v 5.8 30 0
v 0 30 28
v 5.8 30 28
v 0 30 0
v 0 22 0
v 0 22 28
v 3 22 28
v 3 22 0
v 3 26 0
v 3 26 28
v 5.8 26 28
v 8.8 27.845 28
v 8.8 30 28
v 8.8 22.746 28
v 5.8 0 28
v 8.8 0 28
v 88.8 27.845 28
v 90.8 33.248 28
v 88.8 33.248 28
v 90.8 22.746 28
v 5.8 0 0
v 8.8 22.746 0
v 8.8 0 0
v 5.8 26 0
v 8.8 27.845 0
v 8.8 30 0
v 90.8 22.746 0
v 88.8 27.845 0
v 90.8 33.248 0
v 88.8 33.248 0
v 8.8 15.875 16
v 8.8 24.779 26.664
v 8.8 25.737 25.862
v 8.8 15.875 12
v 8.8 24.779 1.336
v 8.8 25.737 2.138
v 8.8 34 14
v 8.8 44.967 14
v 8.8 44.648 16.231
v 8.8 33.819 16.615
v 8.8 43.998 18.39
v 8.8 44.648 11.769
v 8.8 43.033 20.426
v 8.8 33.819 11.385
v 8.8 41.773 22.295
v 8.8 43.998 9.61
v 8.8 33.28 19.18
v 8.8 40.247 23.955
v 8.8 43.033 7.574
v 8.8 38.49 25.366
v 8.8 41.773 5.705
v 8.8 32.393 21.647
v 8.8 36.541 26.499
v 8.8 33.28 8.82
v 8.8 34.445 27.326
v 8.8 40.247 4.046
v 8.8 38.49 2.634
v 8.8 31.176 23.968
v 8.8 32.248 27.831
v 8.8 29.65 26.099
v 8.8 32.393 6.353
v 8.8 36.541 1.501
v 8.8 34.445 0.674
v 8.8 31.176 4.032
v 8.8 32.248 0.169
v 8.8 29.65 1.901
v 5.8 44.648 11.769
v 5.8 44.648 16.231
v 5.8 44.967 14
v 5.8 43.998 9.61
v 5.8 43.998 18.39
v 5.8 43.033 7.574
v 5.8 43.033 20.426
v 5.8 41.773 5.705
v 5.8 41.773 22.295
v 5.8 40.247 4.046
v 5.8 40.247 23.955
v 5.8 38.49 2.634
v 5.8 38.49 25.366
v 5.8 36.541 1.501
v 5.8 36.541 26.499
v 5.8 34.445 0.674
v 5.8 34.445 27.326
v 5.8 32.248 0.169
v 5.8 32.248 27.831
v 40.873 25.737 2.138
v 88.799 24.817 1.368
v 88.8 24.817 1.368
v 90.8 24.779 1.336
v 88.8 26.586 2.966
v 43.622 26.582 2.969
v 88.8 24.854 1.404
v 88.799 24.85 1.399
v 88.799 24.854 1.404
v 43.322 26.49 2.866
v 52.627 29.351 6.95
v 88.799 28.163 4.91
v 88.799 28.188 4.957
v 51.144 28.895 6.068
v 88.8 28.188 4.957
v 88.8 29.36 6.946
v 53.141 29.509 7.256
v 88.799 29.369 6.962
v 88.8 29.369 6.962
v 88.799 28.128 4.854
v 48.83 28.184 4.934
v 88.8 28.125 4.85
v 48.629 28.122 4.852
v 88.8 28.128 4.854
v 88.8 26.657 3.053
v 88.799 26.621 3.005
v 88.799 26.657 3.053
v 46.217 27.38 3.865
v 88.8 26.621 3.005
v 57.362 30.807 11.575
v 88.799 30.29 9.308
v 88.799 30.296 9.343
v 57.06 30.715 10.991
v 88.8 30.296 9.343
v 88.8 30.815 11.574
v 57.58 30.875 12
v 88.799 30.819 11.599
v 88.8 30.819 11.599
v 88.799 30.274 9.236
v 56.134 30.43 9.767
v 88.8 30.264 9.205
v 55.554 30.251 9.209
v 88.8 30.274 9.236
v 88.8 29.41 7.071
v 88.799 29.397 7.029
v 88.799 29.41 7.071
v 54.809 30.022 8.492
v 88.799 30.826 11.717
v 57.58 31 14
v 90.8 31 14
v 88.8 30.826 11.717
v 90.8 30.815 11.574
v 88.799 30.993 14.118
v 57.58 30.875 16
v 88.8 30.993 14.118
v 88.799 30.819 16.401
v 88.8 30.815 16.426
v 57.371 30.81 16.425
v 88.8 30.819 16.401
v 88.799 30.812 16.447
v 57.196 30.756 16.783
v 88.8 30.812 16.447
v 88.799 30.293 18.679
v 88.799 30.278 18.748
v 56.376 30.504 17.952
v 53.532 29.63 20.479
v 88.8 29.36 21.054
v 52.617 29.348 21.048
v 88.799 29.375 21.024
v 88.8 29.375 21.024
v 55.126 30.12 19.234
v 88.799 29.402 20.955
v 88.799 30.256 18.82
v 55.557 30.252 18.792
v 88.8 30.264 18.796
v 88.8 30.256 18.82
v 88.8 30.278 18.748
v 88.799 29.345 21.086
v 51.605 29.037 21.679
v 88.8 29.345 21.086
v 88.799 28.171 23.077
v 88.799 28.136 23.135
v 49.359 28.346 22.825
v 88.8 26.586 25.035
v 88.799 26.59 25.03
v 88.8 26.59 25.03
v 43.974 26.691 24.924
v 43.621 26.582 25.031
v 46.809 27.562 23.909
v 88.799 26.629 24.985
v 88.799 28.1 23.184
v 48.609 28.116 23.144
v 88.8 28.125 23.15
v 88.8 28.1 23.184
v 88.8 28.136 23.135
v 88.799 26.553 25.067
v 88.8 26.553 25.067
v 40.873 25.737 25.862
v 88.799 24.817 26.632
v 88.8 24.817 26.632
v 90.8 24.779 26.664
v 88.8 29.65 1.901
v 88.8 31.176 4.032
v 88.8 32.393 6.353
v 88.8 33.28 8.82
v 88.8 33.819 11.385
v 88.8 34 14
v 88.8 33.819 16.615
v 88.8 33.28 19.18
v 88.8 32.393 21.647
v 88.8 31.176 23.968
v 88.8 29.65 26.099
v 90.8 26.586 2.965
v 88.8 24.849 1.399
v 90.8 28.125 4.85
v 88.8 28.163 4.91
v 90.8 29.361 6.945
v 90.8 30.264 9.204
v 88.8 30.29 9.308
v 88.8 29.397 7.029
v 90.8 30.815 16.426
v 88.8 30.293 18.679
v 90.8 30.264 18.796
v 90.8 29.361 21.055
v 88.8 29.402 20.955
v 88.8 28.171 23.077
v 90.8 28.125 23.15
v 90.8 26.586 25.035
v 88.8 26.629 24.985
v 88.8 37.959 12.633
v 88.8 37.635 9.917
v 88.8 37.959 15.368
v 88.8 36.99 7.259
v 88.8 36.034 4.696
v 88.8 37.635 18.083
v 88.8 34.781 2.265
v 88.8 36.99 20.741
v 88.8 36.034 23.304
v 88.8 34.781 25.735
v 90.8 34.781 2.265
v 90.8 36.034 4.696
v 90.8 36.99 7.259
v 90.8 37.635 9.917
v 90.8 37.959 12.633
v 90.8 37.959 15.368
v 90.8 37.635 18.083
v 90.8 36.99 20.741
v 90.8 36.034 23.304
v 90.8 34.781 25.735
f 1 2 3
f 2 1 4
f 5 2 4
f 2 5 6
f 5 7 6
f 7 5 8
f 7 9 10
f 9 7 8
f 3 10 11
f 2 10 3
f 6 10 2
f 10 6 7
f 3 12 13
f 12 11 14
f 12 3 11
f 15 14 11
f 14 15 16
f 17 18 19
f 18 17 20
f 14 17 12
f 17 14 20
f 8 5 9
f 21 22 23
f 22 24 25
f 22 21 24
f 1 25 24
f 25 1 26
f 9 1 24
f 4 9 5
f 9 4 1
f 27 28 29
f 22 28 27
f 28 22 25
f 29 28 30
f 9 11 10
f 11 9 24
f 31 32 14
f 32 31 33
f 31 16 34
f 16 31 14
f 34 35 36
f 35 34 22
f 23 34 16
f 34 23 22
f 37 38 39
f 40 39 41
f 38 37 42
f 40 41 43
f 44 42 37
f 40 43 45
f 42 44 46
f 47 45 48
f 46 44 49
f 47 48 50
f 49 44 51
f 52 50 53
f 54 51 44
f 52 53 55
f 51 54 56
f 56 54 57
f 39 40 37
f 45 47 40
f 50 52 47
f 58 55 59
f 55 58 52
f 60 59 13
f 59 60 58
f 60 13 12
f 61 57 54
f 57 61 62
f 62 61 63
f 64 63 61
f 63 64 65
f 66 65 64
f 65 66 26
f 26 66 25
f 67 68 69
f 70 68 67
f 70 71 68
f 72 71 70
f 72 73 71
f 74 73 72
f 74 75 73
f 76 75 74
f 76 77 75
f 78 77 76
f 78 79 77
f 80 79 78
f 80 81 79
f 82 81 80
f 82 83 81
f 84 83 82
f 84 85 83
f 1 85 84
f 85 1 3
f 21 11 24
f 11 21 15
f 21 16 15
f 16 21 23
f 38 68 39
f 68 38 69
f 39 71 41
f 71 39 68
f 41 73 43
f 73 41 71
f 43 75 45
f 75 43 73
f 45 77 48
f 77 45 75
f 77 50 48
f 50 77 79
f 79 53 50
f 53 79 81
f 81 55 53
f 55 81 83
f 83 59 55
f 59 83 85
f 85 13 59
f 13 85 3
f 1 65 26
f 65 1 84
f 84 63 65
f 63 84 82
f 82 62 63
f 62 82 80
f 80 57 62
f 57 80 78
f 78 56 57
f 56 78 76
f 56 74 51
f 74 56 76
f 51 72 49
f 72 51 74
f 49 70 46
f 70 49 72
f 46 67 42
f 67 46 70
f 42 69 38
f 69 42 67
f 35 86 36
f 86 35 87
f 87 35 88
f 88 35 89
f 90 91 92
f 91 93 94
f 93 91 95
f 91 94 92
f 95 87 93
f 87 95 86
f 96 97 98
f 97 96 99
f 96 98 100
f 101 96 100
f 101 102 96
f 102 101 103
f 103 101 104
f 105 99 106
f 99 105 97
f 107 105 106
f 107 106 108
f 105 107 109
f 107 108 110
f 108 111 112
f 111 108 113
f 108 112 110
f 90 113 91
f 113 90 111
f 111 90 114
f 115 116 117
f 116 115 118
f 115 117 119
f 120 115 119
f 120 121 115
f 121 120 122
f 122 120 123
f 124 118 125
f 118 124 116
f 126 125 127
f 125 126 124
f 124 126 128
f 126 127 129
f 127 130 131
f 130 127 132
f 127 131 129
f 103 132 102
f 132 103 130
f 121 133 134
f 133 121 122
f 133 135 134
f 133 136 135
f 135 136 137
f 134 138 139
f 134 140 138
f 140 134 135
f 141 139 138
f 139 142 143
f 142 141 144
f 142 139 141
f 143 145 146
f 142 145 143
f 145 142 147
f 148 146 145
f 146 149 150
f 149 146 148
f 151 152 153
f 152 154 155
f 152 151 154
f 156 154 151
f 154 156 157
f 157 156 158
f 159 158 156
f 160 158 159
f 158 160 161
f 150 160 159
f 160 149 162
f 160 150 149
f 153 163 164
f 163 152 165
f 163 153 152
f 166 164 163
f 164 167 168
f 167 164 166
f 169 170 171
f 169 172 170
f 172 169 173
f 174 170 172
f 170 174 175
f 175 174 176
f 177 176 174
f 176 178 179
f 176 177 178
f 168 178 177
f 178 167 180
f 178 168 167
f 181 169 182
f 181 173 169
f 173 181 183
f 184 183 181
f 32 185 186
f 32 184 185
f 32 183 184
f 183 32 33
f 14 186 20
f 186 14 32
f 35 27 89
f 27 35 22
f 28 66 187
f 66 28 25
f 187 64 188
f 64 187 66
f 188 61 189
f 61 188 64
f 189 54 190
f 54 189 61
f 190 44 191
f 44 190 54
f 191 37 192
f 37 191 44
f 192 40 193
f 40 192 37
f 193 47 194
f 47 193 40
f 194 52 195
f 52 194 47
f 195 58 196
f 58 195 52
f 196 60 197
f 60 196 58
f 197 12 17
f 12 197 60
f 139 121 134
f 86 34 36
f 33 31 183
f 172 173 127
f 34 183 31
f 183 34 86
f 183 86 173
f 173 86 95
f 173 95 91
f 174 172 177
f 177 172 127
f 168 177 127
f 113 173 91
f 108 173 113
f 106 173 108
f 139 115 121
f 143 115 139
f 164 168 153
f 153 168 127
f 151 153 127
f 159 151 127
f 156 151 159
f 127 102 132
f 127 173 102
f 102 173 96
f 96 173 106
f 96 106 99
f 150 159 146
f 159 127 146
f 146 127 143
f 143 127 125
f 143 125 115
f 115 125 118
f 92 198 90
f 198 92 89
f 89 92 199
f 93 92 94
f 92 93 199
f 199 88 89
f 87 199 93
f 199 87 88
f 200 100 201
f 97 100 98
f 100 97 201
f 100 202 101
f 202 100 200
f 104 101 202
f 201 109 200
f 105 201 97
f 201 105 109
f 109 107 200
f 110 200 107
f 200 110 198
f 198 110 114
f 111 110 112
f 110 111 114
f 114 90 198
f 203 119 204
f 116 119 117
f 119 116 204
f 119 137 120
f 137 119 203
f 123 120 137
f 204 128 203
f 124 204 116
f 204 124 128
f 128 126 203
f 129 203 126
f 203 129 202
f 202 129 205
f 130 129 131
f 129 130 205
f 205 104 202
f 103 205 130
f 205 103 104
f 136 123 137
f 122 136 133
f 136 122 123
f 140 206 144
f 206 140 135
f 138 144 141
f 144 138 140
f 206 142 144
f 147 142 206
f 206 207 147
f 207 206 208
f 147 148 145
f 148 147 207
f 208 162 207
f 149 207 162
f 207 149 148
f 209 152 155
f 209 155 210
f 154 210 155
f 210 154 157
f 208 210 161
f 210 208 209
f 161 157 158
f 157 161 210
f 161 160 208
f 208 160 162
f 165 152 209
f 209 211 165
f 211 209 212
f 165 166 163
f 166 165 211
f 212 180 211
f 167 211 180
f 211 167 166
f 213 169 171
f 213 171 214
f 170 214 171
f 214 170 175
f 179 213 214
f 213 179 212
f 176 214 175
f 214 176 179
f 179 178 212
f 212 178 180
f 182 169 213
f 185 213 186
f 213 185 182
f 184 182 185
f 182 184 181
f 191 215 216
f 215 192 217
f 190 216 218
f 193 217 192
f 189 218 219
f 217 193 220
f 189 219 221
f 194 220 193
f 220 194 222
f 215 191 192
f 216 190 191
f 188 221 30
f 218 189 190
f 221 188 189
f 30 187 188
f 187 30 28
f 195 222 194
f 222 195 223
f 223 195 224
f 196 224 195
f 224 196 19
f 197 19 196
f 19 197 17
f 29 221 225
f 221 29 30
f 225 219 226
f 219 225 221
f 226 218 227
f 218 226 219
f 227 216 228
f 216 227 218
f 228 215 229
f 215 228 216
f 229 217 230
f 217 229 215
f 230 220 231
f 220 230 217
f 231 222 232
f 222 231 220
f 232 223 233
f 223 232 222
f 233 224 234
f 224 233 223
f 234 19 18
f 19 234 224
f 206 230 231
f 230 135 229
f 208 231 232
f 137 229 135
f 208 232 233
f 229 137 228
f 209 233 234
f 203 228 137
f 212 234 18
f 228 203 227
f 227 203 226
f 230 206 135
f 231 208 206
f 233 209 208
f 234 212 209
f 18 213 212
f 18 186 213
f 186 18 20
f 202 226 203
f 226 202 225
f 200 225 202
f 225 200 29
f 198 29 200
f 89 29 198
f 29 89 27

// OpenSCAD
// Remix of "Spool Holder 1KG for NEO GRRF" ( http://www.thingiverse.com/thing:385773 ) by Luchador

// Laurenz 2014-07-06

// of spool holding middle part (use spool width + 5mm)
length = 80;

// of holder gap, orginally 2mm, gave 1.6mm on reprap neo with simplify3D
gapsize=2.8; //should work with 2.5

//original: holder is 5, big part is 3, gap is 2

module holder(gapsize)
{
	//bigger part of the holder unchanged
	difference()
	{
    luchadorspool();

	 translate([3,0,0])
		cube([100,100,100]);
	
	}

	//smaller part - stretch
	translate([3-.1,0,0]) //shift the overlap into position
		difference()
		{
		 scale([(gapsize+.2)/2,1,1]) //make an overlap of two times .1
			translate([-3,0,0])
				luchadorspool();
	
		 translate([gapsize+.2,0,0]) //make an overlap of two times .1
			cube([5000,5000,5000]);
		
		 //cutoff negative part
		 mirror([1,0,0])
			cube([1000,1000,1000]);
		}
}



// Haken
holder(gapsize);

translate([gapsize-2,0,0])
{
	// Anfangsstueck ohne Haken
	difference()
	{
	 luchadorspool();
	 translate([8,0,0])cube([100,100,100]);
	 cube([5,100,100]);
	}
	
	// Skalierter Mittelteil
	translate([8,0,0])
	 scale([length/82,1,1])
	  translate([-8,0,0])
	   difference()
	   {
	    luchadorspool();
	    union()
	    {
	     cube([8-0.001,200,200]);
	     translate([90,0,0])cube([100,100,100]);
	    }
	   }
	
	// Endstueck
	translate([-82+length,0,0])
	difference()
	{
	 luchadorspool();
	 translate([-1,-1,-1])cube([91-0.001,100,100]);
	}
}	


// created with STL to OpenSCAD converter ( http://www.thingiverse.com/thing:62666 ) ( http://jsfiddle.net/Riham/yzvGD/embedded/result/ )
module luchadorspool(scale) {polyhedron(
 points=[[8,24.779094696044922,26.663768768310547],[8,22.745990753173828,28.000051498413086],[8,0.00002421438694000244,28.000051498413086],[8,24.779094696044922,1.336330771446228],[8,25.736982345581055,2.1375997066497803],[8,15.874530792236328,12.00005054473877],[8,25.736982345581055,25.862499237060547],[8,24.779094696044922,26.663768768310547],[8,15.874530792236328,16.000051498413086],[8,15.874530792236328,16.000051498413086],[8,24.779094696044922,26.663768768310547],[8,0.00002421438694000244,28.000051498413086],[8,15.874530792236328,16.000051498413086],[8,0.00002421438694000244,28.000051498413086],[8,15.874530792236328,12.00005054473877],[8,15.874530792236328,12.00005054473877],[8,0.00002421438694000244,28.000051498413086],[8,0.00002421438694000244,0.000050000002374872565],[8,15.874530792236328,12.00005054473877],[8,0.00002421438694000244,0.000050000002374872565],[8,24.779094696044922,1.336330771446228],[8,24.779094696044922,1.336330771446228],[8,0.00002421438694000244,0.000050000002374872565],[8,22.745990753173828,0.000050000002374872565],[40.87483596801758,25.736982345581055,2.1375997066497803],[8,25.736982345581055,2.1375997066497803],[8,24.779094696044922,1.336330771446228],[92,26.586090087890625,2.965418577194214],[43.692378997802734,26.582246780395508,2.9689066410064697],[92,24.779094696044922,1.336330771446228],[92,24.779094696044922,1.336330771446228],[43.692378997802734,26.582246780395508,2.9689066410064697],[43.38553237915039,26.490190505981445,2.8655965328216553],[92,24.779094696044922,1.336330771446228],[43.38553237915039,26.490190505981445,2.8655965328216553],[40.87483596801758,25.736982345581055,2.1375997066497803],[51.4024772644043,28.895273208618164,6.067709445953369],[92,28.125194549560547,4.849645614624023],[52.92253112792969,29.35129165649414,6.950313568115234],[52.92253112792969,29.35129165649414,6.950313568115234],[92,28.125194549560547,4.849645614624023],[92,29.360822677612305,6.945445537567139],[52.92253112792969,29.35129165649414,6.950313568115234],[92,29.360822677612305,6.945445537567139],[53.44977569580078,29.509464263916016,7.256449222564697],[51.4024772644043,28.895273208618164,6.067709445953369],[49.031253814697266,28.18390655517578,4.934443950653076],[92,28.125194549560547,4.849645614624023],[92,28.125194549560547,4.849645614624023],[49.031253814697266,28.18390655517578,4.934443950653076],[48.824859619140625,28.12198829650879,4.852006435394287],[92,28.125194549560547,4.849645614624023],[48.824859619140625,28.12198829650879,4.852006435394287],[92,26.586090087890625,2.965418577194214],[92,26.586090087890625,2.965418577194214],[48.824859619140625,28.12198829650879,4.852006435394287],[46.35269546508789,27.380340576171875,3.864579439163208],[92,26.586090087890625,2.965418577194214],[46.35269546508789,27.380340576171875,3.864579439163208],[43.692378997802734,26.582246780395508,2.9689066410064697],[57.46689987182617,30.714601516723633,10.99138355255127],[92,30.264408111572266,9.204360961914062],[57.77556610107422,30.807201385498047,11.575401306152344],[57.77556610107422,30.807201385498047,11.575401306152344],[92,30.264408111572266,9.204360961914062],[92,30.81505012512207,11.5741605758667],[57.77556610107422,30.807201385498047,11.575401306152344],[92,30.81505012512207,11.5741605758667],[58,30.874530792236328,12.00005054473877],[57.46689987182617,30.714601516723633,10.99138355255127],[56.517704010009766,30.42984390258789,9.766770362854004],[92,30.264408111572266,9.204360961914062],[92,30.264408111572266,9.204360961914062],[56.517704010009766,30.42984390258789,9.766770362854004],[55.92249298095703,30.251279830932617,9.20854663848877],[92,30.264408111572266,9.204360961914062],[55.92249298095703,30.251279830932617,9.20854663848877],[92,29.360822677612305,6.945445537567139],[92,29.360822677612305,6.945445537567139],[55.92249298095703,30.251279830932617,9.20854663848877],[55.158836364746094,30.02218246459961,8.492351531982422],[92,29.360822677612305,6.945445537567139],[55.158836364746094,30.02218246459961,8.492351531982422],[53.44977569580078,29.509464263916016,7.256449222564697],[58,30.874530792236328,12.00005054473877],[92,30.81505012512207,11.5741605758667],[58,31.000022888183594,14.00005054473877],[58,31.000022888183594,14.00005054473877],[92,30.81505012512207,11.5741605758667],[92,31.000022888183594,14.00005054473877],[58,31.000022888183594,14.00005054473877],[92,31.000022888183594,14.00005054473877],[58,30.874530792236328,16.000051498413086],[58,30.874530792236328,16.000051498413086],[92,31.000022888183594,14.00005054473877],[92,30.81505012512207,16.425941467285156],[58,30.874530792236328,16.000051498413086],[92,30.81505012512207,16.425941467285156],[57.78570556640625,30.810243606567383,16.425212860107422],[57.78570556640625,30.810243606567383,16.425212860107422],[92,30.81505012512207,16.425941467285156],[57.60542297363281,30.75615882873535,16.782894134521484],[57.60542297363281,30.75615882873535,16.782894134521484],[92,30.81505012512207,16.425941467285156],[92,30.264408111572266,18.795740127563477],[57.60542297363281,30.75615882873535,16.782894134521484],[92,30.264408111572266,18.795740127563477],[56.765594482421875,30.504209518432617,17.952293395996094],[52.91258239746094,29.34830665588379,21.048480987548828],[53.850196838378906,29.62959098815918,20.47892189025879],[92,29.360822677612305,21.05465316772461],[92,29.360822677612305,21.05465316772461],[53.850196838378906,29.62959098815918,20.47892189025879],[55.484127044677734,30.119770050048828,19.23390769958496],[92,29.360822677612305,21.05465316772461],[55.484127044677734,30.119770050048828,19.23390769958496],[92,30.264408111572266,18.795740127563477],[92,30.264408111572266,18.795740127563477],[55.484127044677734,30.119770050048828,19.23390769958496],[55.9259033203125,30.252304077148438,18.792081832885742],[92,30.264408111572266,18.795740127563477],[55.9259033203125,30.252304077148438,18.792081832885742],[56.765594482421875,30.504209518432617,17.952293395996094],[52.91258239746094,29.34830665588379,21.048480987548828],[92,29.360822677612305,21.05465316772461],[51.87522506713867,29.037099838256836,21.678625106811523],[51.87522506713867,29.037099838256836,21.678625106811523],[92,29.360822677612305,21.05465316772461],[92,28.125194549560547,23.150455474853516],[51.87522506713867,29.037099838256836,21.678625106811523],[92,28.125194549560547,23.150455474853516],[49.573028564453125,28.3464412689209,22.824626922607422],[43.691871643066406,26.582094192504883,25.03069496154785],[44.053531646728516,26.69059181213379,24.923906326293945],[92,26.586090087890625,25.03468132019043],[92,26.586090087890625,25.03468132019043],[44.053531646728516,26.69059181213379,24.923906326293945],[46.9597053527832,27.562442779541016,23.90891456604004],[92,26.586090087890625,25.03468132019043],[46.9597053527832,27.562442779541016,23.90891456604004],[92,28.125194549560547,23.150455474853516],[92,28.125194549560547,23.150455474853516],[46.9597053527832,27.562442779541016,23.90891456604004],[48.80404281616211,28.11574363708496,23.143686294555664],[92,28.125194549560547,23.150455474853516],[48.80404281616211,28.11574363708496,23.143686294555664],[49.573028564453125,28.3464412689209,22.824626922607422],[43.691871643066406,26.582094192504883,25.03069496154785],[92,26.586090087890625,25.03468132019043],[40.87483596801758,25.736982345581055,25.862499237060547],[40.87483596801758,25.736982345581055,25.862499237060547],[92,26.586090087890625,25.03468132019043],[92,24.779094696044922,26.663768768310547],[40.87483596801758,25.736982345581055,25.862499237060547],[92,24.779094696044922,26.663768768310547],[8,25.736982345581055,25.862499237060547],[8,25.736982345581055,25.862499237060547],[92,24.779094696044922,26.663768768310547],[8,24.779094696044922,26.663768768310547],[8,24.779094696044922,26.663768768310547],[92,24.779094696044922,26.663768768310547],[92,22.745990753173828,28.000051498413086],[8,24.779094696044922,26.663768768310547],[92,22.745990753173828,28.000051498413086],[8,22.745990753173828,28.000051498413086],[40.87483596801758,25.736982345581055,2.1375997066497803],[8,24.779094696044922,1.336330771446228],[92,24.779094696044922,1.336330771446228],[92,24.779094696044922,1.336330771446228],[8,24.779094696044922,1.336330771446228],[8,22.745990753173828,0.000050000002374872565],[92,24.779094696044922,1.336330771446228],[8,22.745990753173828,0.000050000002374872565],[92,22.745990753173828,0.000050000002374872565],[2.423311710667139e-15,30.000022888183594,0.000050000002374872565],[2.423311710667139e-15,30.000022888183594,28.000051498413086],[5,30.000022888183594,0.000050000002374872565],[5,30.000022888183594,0.000050000002374872565],[2.423311710667139e-15,30.000022888183594,28.000051498413086],[5,30.000022888183594,28.000051498413086],[8,34.44451904296875,0.6736247539520264],[8,31.175521850585938,4.0324387550354],[8,29.64979362487793,1.9011133909225464],[8,27.845256805419922,0.000050000002374872565],[8,30.000022888183594,0.000050000002374872565],[8,29.64979362487793,1.9011133909225464],[8,29.64979362487793,1.9011133909225464],[8,30.000022888183594,0.000050000002374872565],[8,32.24764633178711,0.1693996638059616],[8,29.64979362487793,1.9011133909225464],[8,32.24764633178711,0.1693996638059616],[8,34.44451904296875,0.6736247539520264],[8,33.8192253112793,16.614952087402344],[8,43.03263854980469,20.426424026489258],[8,33.28026580810547,19.180086135864258],[8,33.28026580810547,19.180086135864258],[8,43.03263854980469,20.426424026489258],[8,41.77272033691406,22.295406341552734],[8,33.28026580810547,19.180086135864258],[8,41.77272033691406,22.295406341552734],[8,32.393402099609375,21.646636962890625],[8,43.03263854980469,7.573676586151123],[8,33.8192253112793,11.385149002075195],[8,33.28026580810547,8.820013999938965],[8,34.44451904296875,0.6736247539520264],[8,36.541038513183594,1.5013397932052612],[8,31.175521850585938,4.0324387550354],[8,31.175521850585938,4.0324387550354],[8,36.541038513183594,1.5013397932052612],[8,38.4898567199707,2.6338553428649902],[8,31.175521850585938,4.0324387550354],[8,38.4898567199707,2.6338553428649902],[8,32.393402099609375,6.353463172912598],[8,32.393402099609375,6.353463172912598],[8,38.4898567199707,2.6338553428649902],[8,40.24697494506836,4.04559850692749],[8,32.393402099609375,6.353463172912598],[8,40.24697494506836,4.04559850692749],[8,33.28026580810547,8.820013999938965],[8,33.28026580810547,8.820013999938965],[8,40.24697494506836,4.04559850692749],[8,41.77272033691406,5.704692840576172],[8,33.28026580810547,8.820013999938965],[8,41.77272033691406,5.704692840576172],[8,43.03263854980469,7.573676586151123],[8,30.000022888183594,28.000051498413086],[8,27.845256805419922,28.000051498413086],[8,32.24764633178711,27.83070182800293],[8,32.24764633178711,27.83070182800293],[8,27.845256805419922,28.000051498413086],[8,29.64979362487793,26.098987579345703],[8,32.24764633178711,27.83070182800293],[8,29.64979362487793,26.098987579345703],[8,34.44451904296875,27.326475143432617],[8,34.44451904296875,27.326475143432617],[8,29.64979362487793,26.098987579345703],[8,31.175521850585938,23.967660903930664],[8,41.77272033691406,22.295406341552734],[8,40.24697494506836,23.95450210571289],[8,32.393402099609375,21.646636962890625],[8,32.393402099609375,21.646636962890625],[8,40.24697494506836,23.95450210571289],[8,38.4898567199707,25.36624526977539],[8,32.393402099609375,21.646636962890625],[8,38.4898567199707,25.36624526977539],[8,31.175521850585938,23.967660903930664],[8,31.175521850585938,23.967660903930664],[8,38.4898567199707,25.36624526977539],[8,36.541038513183594,26.498760223388672],[8,31.175521850585938,23.967660903930664],[8,36.541038513183594,26.498760223388672],[8,34.44451904296875,27.326475143432617],[8,43.03263854980469,7.573676586151123],[8,43.9982795715332,9.610347747802734],[8,33.8192253112793,11.385149002075195],[8,33.8192253112793,11.385149002075195],[8,43.9982795715332,9.610347747802734],[8,44.6478385925293,11.768717765808105],[8,33.8192253112793,11.385149002075195],[8,44.6478385925293,11.768717765808105],[8,34.000022888183594,14.00005054473877],[8,44.6478385925293,11.768717765808105],[8,44.966651916503906,14.00005054473877],[8,34.000022888183594,14.00005054473877],[8,34.000022888183594,14.00005054473877],[8,44.966651916503906,14.00005054473877],[8,44.6478385925293,16.23138427734375],[8,34.000022888183594,14.00005054473877],[8,44.6478385925293,16.23138427734375],[8,33.8192253112793,16.614952087402344],[8,33.8192253112793,16.614952087402344],[8,44.6478385925293,16.23138427734375],[8,43.9982795715332,18.389753341674805],[8,33.8192253112793,16.614952087402344],[8,43.9982795715332,18.389753341674805],[8,43.03263854980469,20.426424026489258],[0,22.000024795532227,28.000051498413086],[2.423311710667139e-15,30.000022888183594,28.000051498413086],[0,22.000024795532227,0.000050000002374872565],[0,22.000024795532227,0.000050000002374872565],[2.423311710667139e-15,30.000022888183594,28.000051498413086],[2.423311710667139e-15,30.000022888183594,0.000050000002374872565],[3,22.000024795532227,28.000051498413086],[0,22.000024795532227,28.000051498413086],[3,22.000024795532227,0.000050000002374872565],[3,22.000024795532227,0.000050000002374872565],[0,22.000024795532227,28.000051498413086],[0,22.000024795532227,0.000050000002374872565],[3,26.000024795532227,28.000051498413086],[3,22.000024795532227,28.000051498413086],[3,26.000024795532227,0.000050000002374872565],[3,26.000024795532227,0.000050000002374872565],[3,22.000024795532227,28.000051498413086],[3,22.000024795532227,0.000050000002374872565],[5,26.000024795532227,28.000051498413086],[3,26.000024795532227,28.000051498413086],[5,26.000024795532227,0.000050000002374872565],[5,26.000024795532227,0.000050000002374872565],[3,26.000024795532227,28.000051498413086],[3,26.000024795532227,0.000050000002374872565],[5,0.00002421438694000244,28.000051498413086],[5,26.000024795532227,28.000051498413086],[5,0.00002421438694000244,0.000050000002374872565],[5,0.00002421438694000244,0.000050000002374872565],[5,26.000024795532227,28.000051498413086],[5,26.000024795532227,0.000050000002374872565],[8,0.00002421438694000244,28.000051498413086],[5,0.00002421438694000244,28.000051498413086],[8,0.00002421438694000244,0.000050000002374872565],[8,0.00002421438694000244,0.000050000002374872565],[5,0.00002421438694000244,28.000051498413086],[5,0.00002421438694000244,0.000050000002374872565],[0,22.000024795532227,28.000051498413086],[3,22.000024795532227,28.000051498413086],[2.423311710667139e-15,30.000022888183594,28.000051498413086],[2.423311710667139e-15,30.000022888183594,28.000051498413086],[3,22.000024795532227,28.000051498413086],[3,26.000024795532227,28.000051498413086],[2.423311710667139e-15,30.000022888183594,28.000051498413086],[3,26.000024795532227,28.000051498413086],[5,30.000022888183594,28.000051498413086],[5,30.000022888183594,28.000051498413086],[3,26.000024795532227,28.000051498413086],[5,26.000024795532227,28.000051498413086],[5,30.000022888183594,28.000051498413086],[5,26.000024795532227,28.000051498413086],[8,30.000022888183594,28.000051498413086],[8,30.000022888183594,28.000051498413086],[5,26.000024795532227,28.000051498413086],[8,27.845256805419922,28.000051498413086],[92,22.745990753173828,28.000051498413086],[92,33.248313903808594,28.000051498413086],[90,33.248313903808594,28.000051498413086],[5,0.00002421438694000244,28.000051498413086],[8,0.00002421438694000244,28.000051498413086],[5,26.000024795532227,28.000051498413086],[5,26.000024795532227,28.000051498413086],[8,0.00002421438694000244,28.000051498413086],[8,22.745990753173828,28.000051498413086],[5,26.000024795532227,28.000051498413086],[8,22.745990753173828,28.000051498413086],[8,27.845256805419922,28.000051498413086],[8,27.845256805419922,28.000051498413086],[8,22.745990753173828,28.000051498413086],[92,22.745990753173828,28.000051498413086],[8,27.845256805419922,28.000051498413086],[92,22.745990753173828,28.000051498413086],[90,27.845256805419922,28.000051498413086],[90,27.845256805419922,28.000051498413086],[92,22.745990753173828,28.000051498413086],[90,33.248313903808594,28.000051498413086],[8,22.745990753173828,0.000050000002374872565],[8,0.00002421438694000244,0.000050000002374872565],[5,0.00002421438694000244,0.000050000002374872565],[8,30.000022888183594,0.000050000002374872565],[8,27.845256805419922,0.000050000002374872565],[5,30.000022888183594,0.000050000002374872565],[5,30.000022888183594,0.000050000002374872565],[8,27.845256805419922,0.000050000002374872565],[5,26.000024795532227,0.000050000002374872565],[5,30.000022888183594,0.000050000002374872565],[5,26.000024795532227,0.000050000002374872565],[2.423311710667139e-15,30.000022888183594,0.000050000002374872565],[2.423311710667139e-15,30.000022888183594,0.000050000002374872565],[5,26.000024795532227,0.000050000002374872565],[3,26.000024795532227,0.000050000002374872565],[2.423311710667139e-15,30.000022888183594,0.000050000002374872565],[3,26.000024795532227,0.000050000002374872565],[0,22.000024795532227,0.000050000002374872565],[0,22.000024795532227,0.000050000002374872565],[3,26.000024795532227,0.000050000002374872565],[3,22.000024795532227,0.000050000002374872565],[90,33.248313903808594,0.000050000002374872565],[92,33.248313903808594,0.000050000002374872565],[90,27.845256805419922,0.000050000002374872565],[90,27.845256805419922,0.000050000002374872565],[92,33.248313903808594,0.000050000002374872565],[92,22.745990753173828,0.000050000002374872565],[90,27.845256805419922,0.000050000002374872565],[92,22.745990753173828,0.000050000002374872565],[8,27.845256805419922,0.000050000002374872565],[8,27.845256805419922,0.000050000002374872565],[92,22.745990753173828,0.000050000002374872565],[8,22.745990753173828,0.000050000002374872565],[8,27.845256805419922,0.000050000002374872565],[8,22.745990753173828,0.000050000002374872565],[5,26.000024795532227,0.000050000002374872565],[5,26.000024795532227,0.000050000002374872565],[8,22.745990753173828,0.000050000002374872565],[5,0.00002421438694000244,0.000050000002374872565],[90,27.845256805419922,0.000050000002374872565],[8,27.845256805419922,0.000050000002374872565],[8,29.64979362487793,1.9011133909225464],[90,27.845256805419922,0.000050000002374872565],[8,29.64979362487793,1.9011133909225464],[90,29.64979362487793,1.9011133909225464],[90,29.64979362487793,1.9011133909225464],[8,29.64979362487793,1.9011133909225464],[8,31.175521850585938,4.0324387550354],[90,29.64979362487793,1.9011133909225464],[8,31.175521850585938,4.0324387550354],[90,31.175521850585938,4.0324387550354],[90,31.175521850585938,4.0324387550354],[8,31.175521850585938,4.0324387550354],[8,32.393402099609375,6.353463172912598],[90,31.175521850585938,4.0324387550354],[8,32.393402099609375,6.353463172912598],[90,32.393402099609375,6.353463172912598],[90,32.393402099609375,6.353463172912598],[8,32.393402099609375,6.353463172912598],[8,33.28026580810547,8.820013999938965],[90,32.393402099609375,6.353463172912598],[8,33.28026580810547,8.820013999938965],[90,33.28026580810547,8.820013999938965],[90,33.28026580810547,8.820013999938965],[8,33.28026580810547,8.820013999938965],[8,33.8192253112793,11.385149002075195],[90,33.28026580810547,8.820013999938965],[8,33.8192253112793,11.385149002075195],[90,33.8192253112793,11.385149002075195],[90,33.8192253112793,11.385149002075195],[8,33.8192253112793,11.385149002075195],[8,34.000022888183594,14.00005054473877],[90,33.8192253112793,11.385149002075195],[8,34.000022888183594,14.00005054473877],[90,34.000022888183594,14.00005054473877],[90,34.000022888183594,14.00005054473877],[8,34.000022888183594,14.00005054473877],[8,33.8192253112793,16.614952087402344],[90,34.000022888183594,14.00005054473877],[8,33.8192253112793,16.614952087402344],[90,33.8192253112793,16.614952087402344],[90,33.8192253112793,16.614952087402344],[8,33.8192253112793,16.614952087402344],[8,33.28026580810547,19.180086135864258],[90,33.8192253112793,16.614952087402344],[8,33.28026580810547,19.180086135864258],[90,33.28026580810547,19.180086135864258],[90,33.28026580810547,19.180086135864258],[8,33.28026580810547,19.180086135864258],[8,32.393402099609375,21.646636962890625],[90,33.28026580810547,19.180086135864258],[8,32.393402099609375,21.646636962890625],[90,32.393402099609375,21.646636962890625],[90,32.393402099609375,21.646636962890625],[8,32.393402099609375,21.646636962890625],[8,31.175521850585938,23.967660903930664],[90,32.393402099609375,21.646636962890625],[8,31.175521850585938,23.967660903930664],[90,31.175521850585938,23.967660903930664],[90,31.175521850585938,23.967660903930664],[8,31.175521850585938,23.967660903930664],[8,29.64979362487793,26.098987579345703],[90,31.175521850585938,23.967660903930664],[8,29.64979362487793,26.098987579345703],[90,29.64979362487793,26.098987579345703],[90,29.64979362487793,26.098987579345703],[8,29.64979362487793,26.098987579345703],[8,27.845256805419922,28.000051498413086],[90,29.64979362487793,26.098987579345703],[8,27.845256805419922,28.000051498413086],[90,27.845256805419922,28.000051498413086],[90,29.64979362487793,26.098987579345703],[90,27.845256805419922,28.000051498413086],[90,33.248313903808594,28.000051498413086],[90,29.64979362487793,26.098987579345703],[90,33.248313903808594,28.000051498413086],[90,31.175521850585938,23.967660903930664],[90,31.175521850585938,23.967660903930664],[90,33.248313903808594,28.000051498413086],[90,34.78114700317383,25.734920501708984],[90,31.175521850585938,23.967660903930664],[90,34.78114700317383,25.734920501708984],[90,32.393402099609375,21.646636962890625],[90,32.393402099609375,21.646636962890625],[90,34.78114700317383,25.734920501708984],[90,36.034263610839844,23.303850173950195],[90,32.393402099609375,21.646636962890625],[90,36.034263610839844,23.303850173950195],[90,33.28026580810547,19.180086135864258],[90,33.28026580810547,19.180086135864258],[90,36.034263610839844,23.303850173950195],[90,36.98994445800781,20.74121856689453],[90,33.28026580810547,19.180086135864258],[90,36.98994445800781,20.74121856689453],[90,33.8192253112793,16.614952087402344],[90,36.98994445800781,20.74121856689453],[90,37.634674072265625,18.083261489868164],[90,33.8192253112793,16.614952087402344],[90,33.8192253112793,16.614952087402344],[90,37.634674072265625,18.083261489868164],[90,37.95933532714844,15.36756706237793],[90,33.8192253112793,16.614952087402344],[90,37.95933532714844,15.36756706237793],[90,34.000022888183594,14.00005054473877],[90,34.000022888183594,14.00005054473877],[90,37.95933532714844,15.36756706237793],[90,37.95933532714844,12.63253402709961],[90,34.000022888183594,14.00005054473877],[90,37.95933532714844,12.63253402709961],[90,33.8192253112793,11.385149002075195],[90,33.8192253112793,11.385149002075195],[90,37.95933532714844,12.63253402709961],[90,37.634674072265625,9.916838645935059],[90,33.8192253112793,11.385149002075195],[90,37.634674072265625,9.916838645935059],[90,33.28026580810547,8.820013999938965],[90,33.28026580810547,8.820013999938965],[90,37.634674072265625,9.916838645935059],[90,36.98994445800781,7.25888204574585],[90,33.28026580810547,8.820013999938965],[90,36.98994445800781,7.25888204574585],[90,32.393402099609375,6.353463172912598],[90,32.393402099609375,6.353463172912598],[90,36.98994445800781,7.25888204574585],[90,36.034263610839844,4.6962504386901855],[90,32.393402099609375,6.353463172912598],[90,36.034263610839844,4.6962504386901855],[90,31.175521850585938,4.0324387550354],[90,31.175521850585938,4.0324387550354],[90,36.034263610839844,4.6962504386901855],[90,34.78114700317383,2.265181064605713],[90,31.175521850585938,4.0324387550354],[90,34.78114700317383,2.265181064605713],[90,29.64979362487793,1.9011133909225464],[90,29.64979362487793,1.9011133909225464],[90,34.78114700317383,2.265181064605713],[90,33.248313903808594,0.000050000002374872565],[90,29.64979362487793,1.9011133909225464],[90,33.248313903808594,0.000050000002374872565],[90,27.845256805419922,0.000050000002374872565],[92,33.248313903808594,0.000050000002374872565],[90,33.248313903808594,0.000050000002374872565],[90,34.78114700317383,2.265181064605713],[92,33.248313903808594,0.000050000002374872565],[90,34.78114700317383,2.265181064605713],[92,34.78114700317383,2.265181064605713],[92,34.78114700317383,2.265181064605713],[90,34.78114700317383,2.265181064605713],[90,36.034263610839844,4.6962504386901855],[92,34.78114700317383,2.265181064605713],[90,36.034263610839844,4.6962504386901855],[92,36.034263610839844,4.6962504386901855],[92,36.034263610839844,4.6962504386901855],[90,36.034263610839844,4.6962504386901855],[90,36.98994445800781,7.25888204574585],[92,36.034263610839844,4.6962504386901855],[90,36.98994445800781,7.25888204574585],[92,36.98994445800781,7.25888204574585],[92,36.98994445800781,7.25888204574585],[90,36.98994445800781,7.25888204574585],[90,37.634674072265625,9.916838645935059],[92,36.98994445800781,7.25888204574585],[90,37.634674072265625,9.916838645935059],[92,37.634674072265625,9.916838645935059],[92,37.634674072265625,9.916838645935059],[90,37.634674072265625,9.916838645935059],[90,37.95933532714844,12.63253402709961],[92,37.634674072265625,9.916838645935059],[90,37.95933532714844,12.63253402709961],[92,37.95933532714844,12.63253402709961],[92,37.95933532714844,12.63253402709961],[90,37.95933532714844,12.63253402709961],[90,37.95933532714844,15.36756706237793],[92,37.95933532714844,12.63253402709961],[90,37.95933532714844,15.36756706237793],[92,37.95933532714844,15.36756706237793],[92,37.95933532714844,15.36756706237793],[90,37.95933532714844,15.36756706237793],[90,37.634674072265625,18.083261489868164],[92,37.95933532714844,15.36756706237793],[90,37.634674072265625,18.083261489868164],[92,37.634674072265625,18.083261489868164],[92,37.634674072265625,18.083261489868164],[90,37.634674072265625,18.083261489868164],[90,36.98994445800781,20.74121856689453],[92,37.634674072265625,18.083261489868164],[90,36.98994445800781,20.74121856689453],[92,36.98994445800781,20.74121856689453],[92,36.98994445800781,20.74121856689453],[90,36.98994445800781,20.74121856689453],[90,36.034263610839844,23.303850173950195],[92,36.98994445800781,20.74121856689453],[90,36.034263610839844,23.303850173950195],[92,36.034263610839844,23.303850173950195],[92,36.034263610839844,23.303850173950195],[90,36.034263610839844,23.303850173950195],[90,34.78114700317383,25.734920501708984],[92,36.034263610839844,23.303850173950195],[90,34.78114700317383,25.734920501708984],[92,34.78114700317383,25.734920501708984],[92,34.78114700317383,25.734920501708984],[90,34.78114700317383,25.734920501708984],[90,33.248313903808594,28.000051498413086],[92,34.78114700317383,25.734920501708984],[90,33.248313903808594,28.000051498413086],[92,33.248313903808594,28.000051498413086],[92,24.779094696044922,1.336330771446228],[92,22.745990753173828,0.000050000002374872565],[92,33.248313903808594,0.000050000002374872565],[92,33.248313903808594,28.000051498413086],[92,22.745990753173828,28.000051498413086],[92,24.779094696044922,26.663768768310547],[92,24.779094696044922,26.663768768310547],[92,26.586090087890625,25.03468132019043],[92,33.248313903808594,28.000051498413086],[92,33.248313903808594,28.000051498413086],[92,26.586090087890625,25.03468132019043],[92,28.125194549560547,23.150455474853516],[92,33.248313903808594,28.000051498413086],[92,28.125194549560547,23.150455474853516],[92,34.78114700317383,25.734920501708984],[92,34.78114700317383,25.734920501708984],[92,28.125194549560547,23.150455474853516],[92,29.360822677612305,21.05465316772461],[92,34.78114700317383,25.734920501708984],[92,29.360822677612305,21.05465316772461],[92,36.034263610839844,23.303850173950195],[92,36.034263610839844,23.303850173950195],[92,29.360822677612305,21.05465316772461],[92,36.98994445800781,20.74121856689453],[92,36.98994445800781,20.74121856689453],[92,29.360822677612305,21.05465316772461],[92,30.264408111572266,18.795740127563477],[92,36.98994445800781,20.74121856689453],[92,30.264408111572266,18.795740127563477],[92,37.634674072265625,18.083261489868164],[92,37.634674072265625,18.083261489868164],[92,30.264408111572266,18.795740127563477],[92,30.81505012512207,16.425941467285156],[92,37.634674072265625,18.083261489868164],[92,30.81505012512207,16.425941467285156],[92,37.95933532714844,15.36756706237793],[92,37.95933532714844,15.36756706237793],[92,30.81505012512207,16.425941467285156],[92,31.000022888183594,14.00005054473877],[92,37.95933532714844,15.36756706237793],[92,31.000022888183594,14.00005054473877],[92,37.95933532714844,12.63253402709961],[92,37.95933532714844,12.63253402709961],[92,31.000022888183594,14.00005054473877],[92,30.81505012512207,11.5741605758667],[92,37.95933532714844,12.63253402709961],[92,30.81505012512207,11.5741605758667],[92,37.634674072265625,9.916838645935059],[92,37.634674072265625,9.916838645935059],[92,30.81505012512207,11.5741605758667],[92,36.98994445800781,7.25888204574585],[92,36.98994445800781,7.25888204574585],[92,30.81505012512207,11.5741605758667],[92,30.264408111572266,9.204360961914062],[92,36.98994445800781,7.25888204574585],[92,30.264408111572266,9.204360961914062],[92,36.034263610839844,4.6962504386901855],[92,36.034263610839844,4.6962504386901855],[92,30.264408111572266,9.204360961914062],[92,29.360822677612305,6.945445537567139],[92,36.034263610839844,4.6962504386901855],[92,29.360822677612305,6.945445537567139],[92,34.78114700317383,2.265181064605713],[92,34.78114700317383,2.265181064605713],[92,29.360822677612305,6.945445537567139],[92,28.125194549560547,4.849645614624023],[92,34.78114700317383,2.265181064605713],[92,28.125194549560547,4.849645614624023],[92,33.248313903808594,0.000050000002374872565],[92,33.248313903808594,0.000050000002374872565],[92,28.125194549560547,4.849645614624023],[92,26.586090087890625,2.965418577194214],[92,33.248313903808594,0.000050000002374872565],[92,26.586090087890625,2.965418577194214],[92,24.779094696044922,1.336330771446228],[5,32.24764633178711,27.83070182800293],[5,41.77272033691406,22.295406341552734],[5,30.000022888183594,28.000051498413086],[5,30.000022888183594,28.000051498413086],[5,41.77272033691406,22.295406341552734],[5,43.03263854980469,20.426424026489258],[5,41.77272033691406,5.704692840576172],[5,30.000022888183594,28.000051498413086],[5,43.03263854980469,7.573676586151123],[5,43.03263854980469,7.573676586151123],[5,30.000022888183594,28.000051498413086],[5,44.6478385925293,11.768717765808105],[5,43.03263854980469,7.573676586151123],[5,44.6478385925293,11.768717765808105],[5,43.9982795715332,9.610347747802734],[5,30.000022888183594,0.000050000002374872565],[5,30.000022888183594,28.000051498413086],[5,32.24764633178711,0.1693996638059616],[5,32.24764633178711,0.1693996638059616],[5,30.000022888183594,28.000051498413086],[5,41.77272033691406,5.704692840576172],[5,32.24764633178711,0.1693996638059616],[5,41.77272033691406,5.704692840576172],[5,34.44451904296875,0.6736247539520264],[5,34.44451904296875,0.6736247539520264],[5,41.77272033691406,5.704692840576172],[5,40.24697494506836,4.04559850692749],[5,34.44451904296875,0.6736247539520264],[5,40.24697494506836,4.04559850692749],[5,36.541038513183594,1.5013397932052612],[5,36.541038513183594,1.5013397932052612],[5,40.24697494506836,4.04559850692749],[5,38.4898567199707,2.6338553428649902],[5,40.24697494506836,23.95450210571289],[5,41.77272033691406,22.295406341552734],[5,38.4898567199707,25.36624526977539],[5,38.4898567199707,25.36624526977539],[5,41.77272033691406,22.295406341552734],[5,32.24764633178711,27.83070182800293],[5,38.4898567199707,25.36624526977539],[5,32.24764633178711,27.83070182800293],[5,36.541038513183594,26.498760223388672],[5,36.541038513183594,26.498760223388672],[5,32.24764633178711,27.83070182800293],[5,34.44451904296875,27.326475143432617],[5,44.966651916503906,14.00005054473877],[5,44.6478385925293,11.768717765808105],[5,44.6478385925293,16.23138427734375],[5,44.6478385925293,16.23138427734375],[5,44.6478385925293,11.768717765808105],[5,30.000022888183594,28.000051498413086],[5,44.6478385925293,16.23138427734375],[5,30.000022888183594,28.000051498413086],[5,43.9982795715332,18.389753341674805],[5,43.9982795715332,18.389753341674805],[5,30.000022888183594,28.000051498413086],[5,43.03263854980469,20.426424026489258],[8,44.966651916503906,14.00005054473877],[5,44.966651916503906,14.00005054473877],[5,44.6478385925293,16.23138427734375],[8,44.966651916503906,14.00005054473877],[5,44.6478385925293,16.23138427734375],[8,44.6478385925293,16.23138427734375],[8,44.6478385925293,16.23138427734375],[5,44.6478385925293,16.23138427734375],[5,43.9982795715332,18.389753341674805],[8,44.6478385925293,16.23138427734375],[5,43.9982795715332,18.389753341674805],[8,43.9982795715332,18.389753341674805],[8,43.9982795715332,18.389753341674805],[5,43.9982795715332,18.389753341674805],[5,43.03263854980469,20.426424026489258],[8,43.9982795715332,18.389753341674805],[5,43.03263854980469,20.426424026489258],[8,43.03263854980469,20.426424026489258],[8,43.03263854980469,20.426424026489258],[5,43.03263854980469,20.426424026489258],[5,41.77272033691406,22.295406341552734],[8,43.03263854980469,20.426424026489258],[5,41.77272033691406,22.295406341552734],[8,41.77272033691406,22.295406341552734],[8,41.77272033691406,22.295406341552734],[5,41.77272033691406,22.295406341552734],[5,40.24697494506836,23.95450210571289],[8,41.77272033691406,22.295406341552734],[5,40.24697494506836,23.95450210571289],[8,40.24697494506836,23.95450210571289],[8,40.24697494506836,23.95450210571289],[5,40.24697494506836,23.95450210571289],[5,38.4898567199707,25.36624526977539],[8,40.24697494506836,23.95450210571289],[5,38.4898567199707,25.36624526977539],[8,38.4898567199707,25.36624526977539],[8,38.4898567199707,25.36624526977539],[5,38.4898567199707,25.36624526977539],[5,36.541038513183594,26.498760223388672],[8,38.4898567199707,25.36624526977539],[5,36.541038513183594,26.498760223388672],[8,36.541038513183594,26.498760223388672],[8,36.541038513183594,26.498760223388672],[5,36.541038513183594,26.498760223388672],[5,34.44451904296875,27.326475143432617],[8,36.541038513183594,26.498760223388672],[5,34.44451904296875,27.326475143432617],[8,34.44451904296875,27.326475143432617],[8,34.44451904296875,27.326475143432617],[5,34.44451904296875,27.326475143432617],[5,32.24764633178711,27.83070182800293],[8,34.44451904296875,27.326475143432617],[5,32.24764633178711,27.83070182800293],[8,32.24764633178711,27.83070182800293],[8,32.24764633178711,27.83070182800293],[5,32.24764633178711,27.83070182800293],[5,30.000022888183594,28.000051498413086],[8,32.24764633178711,27.83070182800293],[5,30.000022888183594,28.000051498413086],[8,30.000022888183594,28.000051498413086],[8,30.000022888183594,0.000050000002374872565],[5,30.000022888183594,0.000050000002374872565],[5,32.24764633178711,0.1693996638059616],[8,30.000022888183594,0.000050000002374872565],[5,32.24764633178711,0.1693996638059616],[8,32.24764633178711,0.1693996638059616],[8,32.24764633178711,0.1693996638059616],[5,32.24764633178711,0.1693996638059616],[5,34.44451904296875,0.6736247539520264],[8,32.24764633178711,0.1693996638059616],[5,34.44451904296875,0.6736247539520264],[8,34.44451904296875,0.6736247539520264],[8,34.44451904296875,0.6736247539520264],[5,34.44451904296875,0.6736247539520264],[5,36.541038513183594,1.5013397932052612],[8,34.44451904296875,0.6736247539520264],[5,36.541038513183594,1.5013397932052612],[8,36.541038513183594,1.5013397932052612],[8,36.541038513183594,1.5013397932052612],[5,36.541038513183594,1.5013397932052612],[5,38.4898567199707,2.6338553428649902],[8,36.541038513183594,1.5013397932052612],[5,38.4898567199707,2.6338553428649902],[8,38.4898567199707,2.6338553428649902],[8,38.4898567199707,2.6338553428649902],[5,38.4898567199707,2.6338553428649902],[5,40.24697494506836,4.04559850692749],[8,38.4898567199707,2.6338553428649902],[5,40.24697494506836,4.04559850692749],[8,40.24697494506836,4.04559850692749],[8,40.24697494506836,4.04559850692749],[5,40.24697494506836,4.04559850692749],[5,41.77272033691406,5.704692840576172],[8,40.24697494506836,4.04559850692749],[5,41.77272033691406,5.704692840576172],[8,41.77272033691406,5.704692840576172],[8,41.77272033691406,5.704692840576172],[5,41.77272033691406,5.704692840576172],[5,43.03263854980469,7.573676586151123],[8,41.77272033691406,5.704692840576172],[5,43.03263854980469,7.573676586151123],[8,43.03263854980469,7.573676586151123],[8,43.03263854980469,7.573676586151123],[5,43.03263854980469,7.573676586151123],[5,43.9982795715332,9.610347747802734],[8,43.03263854980469,7.573676586151123],[5,43.9982795715332,9.610347747802734],[8,43.9982795715332,9.610347747802734],[8,43.9982795715332,9.610347747802734],[5,43.9982795715332,9.610347747802734],[5,44.6478385925293,11.768717765808105],[8,43.9982795715332,9.610347747802734],[5,44.6478385925293,11.768717765808105],[8,44.6478385925293,11.768717765808105],[8,44.6478385925293,11.768717765808105],[5,44.6478385925293,11.768717765808105],[5,44.966651916503906,14.00005054473877],[8,44.6478385925293,11.768717765808105],[5,44.966651916503906,14.00005054473877],[8,44.966651916503906,14.00005054473877],[58,31.000022888183594,14.00005054473877],[58,30.874530792236328,16.000051498413086],[58,30.874530792236328,12.00005054473877],[40.87483596801758,25.736982345581055,2.1375997066497803],[8,15.874530792236328,12.00005054473877],[8,25.736982345581055,2.1375997066497803],[8,15.874530792236328,16.000051498413086],[40.87483596801758,25.736982345581055,25.862499237060547],[8,25.736982345581055,25.862499237060547],[44.053531646728516,26.69059181213379,24.923906326293945],[43.691871643066406,26.582094192504883,25.03069496154785],[55.92249298095703,30.251279830932617,9.20854663848877],[8,15.874530792236328,16.000051498413086],[8,15.874530792236328,12.00005054473877],[40.87483596801758,25.736982345581055,25.862499237060547],[40.87483596801758,25.736982345581055,25.862499237060547],[8,15.874530792236328,12.00005054473877],[40.87483596801758,25.736982345581055,2.1375997066497803],[40.87483596801758,25.736982345581055,25.862499237060547],[40.87483596801758,25.736982345581055,2.1375997066497803],[43.691871643066406,26.582094192504883,25.03069496154785],[43.691871643066406,26.582094192504883,25.03069496154785],[40.87483596801758,25.736982345581055,2.1375997066497803],[43.38553237915039,26.490190505981445,2.8655965328216553],[43.691871643066406,26.582094192504883,25.03069496154785],[43.38553237915039,26.490190505981445,2.8655965328216553],[43.692378997802734,26.582246780395508,2.9689066410064697],[46.9597053527832,27.562442779541016,23.90891456604004],[44.053531646728516,26.69059181213379,24.923906326293945],[48.80404281616211,28.11574363708496,23.143686294555664],[48.80404281616211,28.11574363708496,23.143686294555664],[44.053531646728516,26.69059181213379,24.923906326293945],[55.92249298095703,30.251279830932617,9.20854663848877],[48.80404281616211,28.11574363708496,23.143686294555664],[55.92249298095703,30.251279830932617,9.20854663848877],[49.573028564453125,28.3464412689209,22.824626922607422],[43.692378997802734,26.582246780395508,2.9689066410064697],[46.35269546508789,27.380340576171875,3.864579439163208],[43.691871643066406,26.582094192504883,25.03069496154785],[43.691871643066406,26.582094192504883,25.03069496154785],[46.35269546508789,27.380340576171875,3.864579439163208],[48.824859619140625,28.12198829650879,4.852006435394287],[43.691871643066406,26.582094192504883,25.03069496154785],[48.824859619140625,28.12198829650879,4.852006435394287],[49.031253814697266,28.18390655517578,4.934443950653076],[58,30.874530792236328,12.00005054473877],[58,30.874530792236328,16.000051498413086],[57.77556610107422,30.807201385498047,11.575401306152344],[57.77556610107422,30.807201385498047,11.575401306152344],[58,30.874530792236328,16.000051498413086],[57.78570556640625,30.810243606567383,16.425212860107422],[51.87522506713867,29.037099838256836,21.678625106811523],[49.573028564453125,28.3464412689209,22.824626922607422],[52.91258239746094,29.34830665588379,21.048480987548828],[52.91258239746094,29.34830665588379,21.048480987548828],[49.573028564453125,28.3464412689209,22.824626922607422],[55.92249298095703,30.251279830932617,9.20854663848877],[52.91258239746094,29.34830665588379,21.048480987548828],[55.92249298095703,30.251279830932617,9.20854663848877],[53.850196838378906,29.62959098815918,20.47892189025879],[53.850196838378906,29.62959098815918,20.47892189025879],[55.92249298095703,30.251279830932617,9.20854663848877],[55.9259033203125,30.252304077148438,18.792081832885742],[53.850196838378906,29.62959098815918,20.47892189025879],[55.9259033203125,30.252304077148438,18.792081832885742],[55.484127044677734,30.119770050048828,19.23390769958496],[55.158836364746094,30.02218246459961,8.492351531982422],[55.92249298095703,30.251279830932617,9.20854663848877],[53.44977569580078,29.509464263916016,7.256449222564697],[53.44977569580078,29.509464263916016,7.256449222564697],[55.92249298095703,30.251279830932617,9.20854663848877],[43.691871643066406,26.582094192504883,25.03069496154785],[53.44977569580078,29.509464263916016,7.256449222564697],[43.691871643066406,26.582094192504883,25.03069496154785],[52.92253112792969,29.35129165649414,6.950313568115234],[52.92253112792969,29.35129165649414,6.950313568115234],[43.691871643066406,26.582094192504883,25.03069496154785],[49.031253814697266,28.18390655517578,4.934443950653076],[52.92253112792969,29.35129165649414,6.950313568115234],[49.031253814697266,28.18390655517578,4.934443950653076],[51.4024772644043,28.895273208618164,6.067709445953369],[56.765594482421875,30.504209518432617,17.952293395996094],[55.9259033203125,30.252304077148438,18.792081832885742],[57.60542297363281,30.75615882873535,16.782894134521484],[57.60542297363281,30.75615882873535,16.782894134521484],[55.9259033203125,30.252304077148438,18.792081832885742],[55.92249298095703,30.251279830932617,9.20854663848877],[57.60542297363281,30.75615882873535,16.782894134521484],[55.92249298095703,30.251279830932617,9.20854663848877],[57.78570556640625,30.810243606567383,16.425212860107422],[57.78570556640625,30.810243606567383,16.425212860107422],[55.92249298095703,30.251279830932617,9.20854663848877],[56.517704010009766,30.42984390258789,9.766770362854004],[57.78570556640625,30.810243606567383,16.425212860107422],[56.517704010009766,30.42984390258789,9.766770362854004],[57.77556610107422,30.807201385498047,11.575401306152344],[57.77556610107422,30.807201385498047,11.575401306152344],[56.517704010009766,30.42984390258789,9.766770362854004],[57.46689987182617,30.714601516723633,10.99138355255127] ],
faces=[[0,1,2],[3,4,5],[6,7,8],[9,10,11],[12,13,14],[15,16,17],[18,19,20],[21,22,23],[24,25,26],[27,28,29],[30,31,32],[33,34,35],[36,37,38],[39,40,41],[42,43,44],[45,46,47],[48,49,50],[51,52,53],[54,55,56],[57,58,59],[60,61,62],[63,64,65],[66,67,68],[69,70,71],[72,73,74],[75,76,77],[78,79,80],[81,82,83],[84,85,86],[87,88,89],[90,91,92],[93,94,95],[96,97,98],[99,100,101],[102,103,104],[105,106,107],[108,109,110],[111,112,113],[114,115,116],[117,118,119],[120,121,122],[123,124,125],[126,127,128],[129,130,131],[132,133,134],[135,136,137],[138,139,140],[141,142,143],[144,145,146],[147,148,149],[150,151,152],[153,154,155],[156,157,158],[159,160,161],[162,163,164],[165,166,167],[168,169,170],[171,172,173],[174,175,176],[177,178,179],[180,181,182],[183,184,185],[186,187,188],[189,190,191],[192,193,194],[195,196,197],[198,199,200],[201,202,203],[204,205,206],[207,208,209],[210,211,212],[213,214,215],[216,217,218],[219,220,221],[222,223,224],[225,226,227],[228,229,230],[231,232,233],[234,235,236],[237,238,239],[240,241,242],[243,244,245],[246,247,248],[249,250,251],[252,253,254],[255,256,257],[258,259,260],[261,262,263],[264,265,266],[267,268,269],[270,271,272],[273,274,275],[276,277,278],[279,280,281],[282,283,284],[285,286,287],[288,289,290],[291,292,293],[294,295,296],[297,298,299],[300,301,302],[303,304,305],[306,307,308],[309,310,311],[312,313,314],[315,316,317],[318,319,320],[321,322,323],[324,325,326],[327,328,329],[330,331,332],[333,334,335],[336,337,338],[339,340,341],[342,343,344],[345,346,347],[348,349,350],[351,352,353],[354,355,356],[357,358,359],[360,361,362],[363,364,365],[366,367,368],[369,370,371],[372,373,374],[375,376,377],[378,379,380],[381,382,383],[384,385,386],[387,388,389],[390,391,392],[393,394,395],[396,397,398],[399,400,401],[402,403,404],[405,406,407],[408,409,410],[411,412,413],[414,415,416],[417,418,419],[420,421,422],[423,424,425],[426,427,428],[429,430,431],[432,433,434],[435,436,437],[438,439,440],[441,442,443],[444,445,446],[447,448,449],[450,451,452],[453,454,455],[456,457,458],[459,460,461],[462,463,464],[465,466,467],[468,469,470],[471,472,473],[474,475,476],[477,478,479],[480,481,482],[483,484,485],[486,487,488],[489,490,491],[492,493,494],[495,496,497],[498,499,500],[501,502,503],[504,505,506],[507,508,509],[510,511,512],[513,514,515],[516,517,518],[519,520,521],[522,523,524],[525,526,527],[528,529,530],[531,532,533],[534,535,536],[537,538,539],[540,541,542],[543,544,545],[546,547,548],[549,550,551],[552,553,554],[555,556,557],[558,559,560],[561,562,563],[564,565,566],[567,568,569],[570,571,572],[573,574,575],[576,577,578],[579,580,581],[582,583,584],[585,586,587],[588,589,590],[591,592,593],[594,595,596],[597,598,599],[600,601,602],[603,604,605],[606,607,608],[609,610,611],[612,613,614],[615,616,617],[618,619,620],[621,622,623],[624,625,626],[627,628,629],[630,631,632],[633,634,635],[636,637,638],[639,640,641],[642,643,644],[645,646,647],[648,649,650],[651,652,653],[654,655,656],[657,658,659],[660,661,662],[663,664,665],[666,667,668],[669,670,671],[672,673,674],[675,676,677],[678,679,680],[681,682,683],[684,685,686],[687,688,689],[690,691,692],[693,694,695],[696,697,698],[699,700,701],[702,703,704],[705,706,707],[708,709,710],[711,712,713],[714,715,716],[717,718,719],[720,721,722],[723,724,725],[726,727,728],[729,730,731],[732,733,734],[735,736,737],[738,739,740],[741,742,743],[744,745,746],[747,748,749],[750,751,752],[753,754,755],[756,757,758],[759,760,761],[762,763,764],[765,766,767],[768,769,770],[771,772,773],[774,775,776],[777,778,779],[780,781,782],[783,784,785],[786,787,788],[789,790,791],[792,793,794],[795,796,797],[798,799,800],[801,802,803],[804,805,806],[807,808,809],[810,811,812],[813,814,815],[816,817,818],[819,820,821],[822,823,824],[825,826,827],[828,829,830],[831,832,833],[834,835,836],[837,838,839],[840,841,842],[843,844,845],[846,847,848],[849,850,851],[852,853,854],[855,856,857],[858,859,860],[861,862,863],[864,865,866],[867,868,869],[870,871,872],[873,874,875],[876,877,878],[879,880,881],[882,883,884],[885,886,887],[888,889,890],[891,892,893],[894,895,896],[897,898,899],[900,901,902],[903,904,905],[906,907,908],[909,910,911],[912,913,914],[915,916,917],[918,919,920],[921,922,923],[924,925,926],[927,928,929],[930,931,932],[933,934,935],[936,937,938],[939,940,941],[942,943,944],[945,946,947]]);}
